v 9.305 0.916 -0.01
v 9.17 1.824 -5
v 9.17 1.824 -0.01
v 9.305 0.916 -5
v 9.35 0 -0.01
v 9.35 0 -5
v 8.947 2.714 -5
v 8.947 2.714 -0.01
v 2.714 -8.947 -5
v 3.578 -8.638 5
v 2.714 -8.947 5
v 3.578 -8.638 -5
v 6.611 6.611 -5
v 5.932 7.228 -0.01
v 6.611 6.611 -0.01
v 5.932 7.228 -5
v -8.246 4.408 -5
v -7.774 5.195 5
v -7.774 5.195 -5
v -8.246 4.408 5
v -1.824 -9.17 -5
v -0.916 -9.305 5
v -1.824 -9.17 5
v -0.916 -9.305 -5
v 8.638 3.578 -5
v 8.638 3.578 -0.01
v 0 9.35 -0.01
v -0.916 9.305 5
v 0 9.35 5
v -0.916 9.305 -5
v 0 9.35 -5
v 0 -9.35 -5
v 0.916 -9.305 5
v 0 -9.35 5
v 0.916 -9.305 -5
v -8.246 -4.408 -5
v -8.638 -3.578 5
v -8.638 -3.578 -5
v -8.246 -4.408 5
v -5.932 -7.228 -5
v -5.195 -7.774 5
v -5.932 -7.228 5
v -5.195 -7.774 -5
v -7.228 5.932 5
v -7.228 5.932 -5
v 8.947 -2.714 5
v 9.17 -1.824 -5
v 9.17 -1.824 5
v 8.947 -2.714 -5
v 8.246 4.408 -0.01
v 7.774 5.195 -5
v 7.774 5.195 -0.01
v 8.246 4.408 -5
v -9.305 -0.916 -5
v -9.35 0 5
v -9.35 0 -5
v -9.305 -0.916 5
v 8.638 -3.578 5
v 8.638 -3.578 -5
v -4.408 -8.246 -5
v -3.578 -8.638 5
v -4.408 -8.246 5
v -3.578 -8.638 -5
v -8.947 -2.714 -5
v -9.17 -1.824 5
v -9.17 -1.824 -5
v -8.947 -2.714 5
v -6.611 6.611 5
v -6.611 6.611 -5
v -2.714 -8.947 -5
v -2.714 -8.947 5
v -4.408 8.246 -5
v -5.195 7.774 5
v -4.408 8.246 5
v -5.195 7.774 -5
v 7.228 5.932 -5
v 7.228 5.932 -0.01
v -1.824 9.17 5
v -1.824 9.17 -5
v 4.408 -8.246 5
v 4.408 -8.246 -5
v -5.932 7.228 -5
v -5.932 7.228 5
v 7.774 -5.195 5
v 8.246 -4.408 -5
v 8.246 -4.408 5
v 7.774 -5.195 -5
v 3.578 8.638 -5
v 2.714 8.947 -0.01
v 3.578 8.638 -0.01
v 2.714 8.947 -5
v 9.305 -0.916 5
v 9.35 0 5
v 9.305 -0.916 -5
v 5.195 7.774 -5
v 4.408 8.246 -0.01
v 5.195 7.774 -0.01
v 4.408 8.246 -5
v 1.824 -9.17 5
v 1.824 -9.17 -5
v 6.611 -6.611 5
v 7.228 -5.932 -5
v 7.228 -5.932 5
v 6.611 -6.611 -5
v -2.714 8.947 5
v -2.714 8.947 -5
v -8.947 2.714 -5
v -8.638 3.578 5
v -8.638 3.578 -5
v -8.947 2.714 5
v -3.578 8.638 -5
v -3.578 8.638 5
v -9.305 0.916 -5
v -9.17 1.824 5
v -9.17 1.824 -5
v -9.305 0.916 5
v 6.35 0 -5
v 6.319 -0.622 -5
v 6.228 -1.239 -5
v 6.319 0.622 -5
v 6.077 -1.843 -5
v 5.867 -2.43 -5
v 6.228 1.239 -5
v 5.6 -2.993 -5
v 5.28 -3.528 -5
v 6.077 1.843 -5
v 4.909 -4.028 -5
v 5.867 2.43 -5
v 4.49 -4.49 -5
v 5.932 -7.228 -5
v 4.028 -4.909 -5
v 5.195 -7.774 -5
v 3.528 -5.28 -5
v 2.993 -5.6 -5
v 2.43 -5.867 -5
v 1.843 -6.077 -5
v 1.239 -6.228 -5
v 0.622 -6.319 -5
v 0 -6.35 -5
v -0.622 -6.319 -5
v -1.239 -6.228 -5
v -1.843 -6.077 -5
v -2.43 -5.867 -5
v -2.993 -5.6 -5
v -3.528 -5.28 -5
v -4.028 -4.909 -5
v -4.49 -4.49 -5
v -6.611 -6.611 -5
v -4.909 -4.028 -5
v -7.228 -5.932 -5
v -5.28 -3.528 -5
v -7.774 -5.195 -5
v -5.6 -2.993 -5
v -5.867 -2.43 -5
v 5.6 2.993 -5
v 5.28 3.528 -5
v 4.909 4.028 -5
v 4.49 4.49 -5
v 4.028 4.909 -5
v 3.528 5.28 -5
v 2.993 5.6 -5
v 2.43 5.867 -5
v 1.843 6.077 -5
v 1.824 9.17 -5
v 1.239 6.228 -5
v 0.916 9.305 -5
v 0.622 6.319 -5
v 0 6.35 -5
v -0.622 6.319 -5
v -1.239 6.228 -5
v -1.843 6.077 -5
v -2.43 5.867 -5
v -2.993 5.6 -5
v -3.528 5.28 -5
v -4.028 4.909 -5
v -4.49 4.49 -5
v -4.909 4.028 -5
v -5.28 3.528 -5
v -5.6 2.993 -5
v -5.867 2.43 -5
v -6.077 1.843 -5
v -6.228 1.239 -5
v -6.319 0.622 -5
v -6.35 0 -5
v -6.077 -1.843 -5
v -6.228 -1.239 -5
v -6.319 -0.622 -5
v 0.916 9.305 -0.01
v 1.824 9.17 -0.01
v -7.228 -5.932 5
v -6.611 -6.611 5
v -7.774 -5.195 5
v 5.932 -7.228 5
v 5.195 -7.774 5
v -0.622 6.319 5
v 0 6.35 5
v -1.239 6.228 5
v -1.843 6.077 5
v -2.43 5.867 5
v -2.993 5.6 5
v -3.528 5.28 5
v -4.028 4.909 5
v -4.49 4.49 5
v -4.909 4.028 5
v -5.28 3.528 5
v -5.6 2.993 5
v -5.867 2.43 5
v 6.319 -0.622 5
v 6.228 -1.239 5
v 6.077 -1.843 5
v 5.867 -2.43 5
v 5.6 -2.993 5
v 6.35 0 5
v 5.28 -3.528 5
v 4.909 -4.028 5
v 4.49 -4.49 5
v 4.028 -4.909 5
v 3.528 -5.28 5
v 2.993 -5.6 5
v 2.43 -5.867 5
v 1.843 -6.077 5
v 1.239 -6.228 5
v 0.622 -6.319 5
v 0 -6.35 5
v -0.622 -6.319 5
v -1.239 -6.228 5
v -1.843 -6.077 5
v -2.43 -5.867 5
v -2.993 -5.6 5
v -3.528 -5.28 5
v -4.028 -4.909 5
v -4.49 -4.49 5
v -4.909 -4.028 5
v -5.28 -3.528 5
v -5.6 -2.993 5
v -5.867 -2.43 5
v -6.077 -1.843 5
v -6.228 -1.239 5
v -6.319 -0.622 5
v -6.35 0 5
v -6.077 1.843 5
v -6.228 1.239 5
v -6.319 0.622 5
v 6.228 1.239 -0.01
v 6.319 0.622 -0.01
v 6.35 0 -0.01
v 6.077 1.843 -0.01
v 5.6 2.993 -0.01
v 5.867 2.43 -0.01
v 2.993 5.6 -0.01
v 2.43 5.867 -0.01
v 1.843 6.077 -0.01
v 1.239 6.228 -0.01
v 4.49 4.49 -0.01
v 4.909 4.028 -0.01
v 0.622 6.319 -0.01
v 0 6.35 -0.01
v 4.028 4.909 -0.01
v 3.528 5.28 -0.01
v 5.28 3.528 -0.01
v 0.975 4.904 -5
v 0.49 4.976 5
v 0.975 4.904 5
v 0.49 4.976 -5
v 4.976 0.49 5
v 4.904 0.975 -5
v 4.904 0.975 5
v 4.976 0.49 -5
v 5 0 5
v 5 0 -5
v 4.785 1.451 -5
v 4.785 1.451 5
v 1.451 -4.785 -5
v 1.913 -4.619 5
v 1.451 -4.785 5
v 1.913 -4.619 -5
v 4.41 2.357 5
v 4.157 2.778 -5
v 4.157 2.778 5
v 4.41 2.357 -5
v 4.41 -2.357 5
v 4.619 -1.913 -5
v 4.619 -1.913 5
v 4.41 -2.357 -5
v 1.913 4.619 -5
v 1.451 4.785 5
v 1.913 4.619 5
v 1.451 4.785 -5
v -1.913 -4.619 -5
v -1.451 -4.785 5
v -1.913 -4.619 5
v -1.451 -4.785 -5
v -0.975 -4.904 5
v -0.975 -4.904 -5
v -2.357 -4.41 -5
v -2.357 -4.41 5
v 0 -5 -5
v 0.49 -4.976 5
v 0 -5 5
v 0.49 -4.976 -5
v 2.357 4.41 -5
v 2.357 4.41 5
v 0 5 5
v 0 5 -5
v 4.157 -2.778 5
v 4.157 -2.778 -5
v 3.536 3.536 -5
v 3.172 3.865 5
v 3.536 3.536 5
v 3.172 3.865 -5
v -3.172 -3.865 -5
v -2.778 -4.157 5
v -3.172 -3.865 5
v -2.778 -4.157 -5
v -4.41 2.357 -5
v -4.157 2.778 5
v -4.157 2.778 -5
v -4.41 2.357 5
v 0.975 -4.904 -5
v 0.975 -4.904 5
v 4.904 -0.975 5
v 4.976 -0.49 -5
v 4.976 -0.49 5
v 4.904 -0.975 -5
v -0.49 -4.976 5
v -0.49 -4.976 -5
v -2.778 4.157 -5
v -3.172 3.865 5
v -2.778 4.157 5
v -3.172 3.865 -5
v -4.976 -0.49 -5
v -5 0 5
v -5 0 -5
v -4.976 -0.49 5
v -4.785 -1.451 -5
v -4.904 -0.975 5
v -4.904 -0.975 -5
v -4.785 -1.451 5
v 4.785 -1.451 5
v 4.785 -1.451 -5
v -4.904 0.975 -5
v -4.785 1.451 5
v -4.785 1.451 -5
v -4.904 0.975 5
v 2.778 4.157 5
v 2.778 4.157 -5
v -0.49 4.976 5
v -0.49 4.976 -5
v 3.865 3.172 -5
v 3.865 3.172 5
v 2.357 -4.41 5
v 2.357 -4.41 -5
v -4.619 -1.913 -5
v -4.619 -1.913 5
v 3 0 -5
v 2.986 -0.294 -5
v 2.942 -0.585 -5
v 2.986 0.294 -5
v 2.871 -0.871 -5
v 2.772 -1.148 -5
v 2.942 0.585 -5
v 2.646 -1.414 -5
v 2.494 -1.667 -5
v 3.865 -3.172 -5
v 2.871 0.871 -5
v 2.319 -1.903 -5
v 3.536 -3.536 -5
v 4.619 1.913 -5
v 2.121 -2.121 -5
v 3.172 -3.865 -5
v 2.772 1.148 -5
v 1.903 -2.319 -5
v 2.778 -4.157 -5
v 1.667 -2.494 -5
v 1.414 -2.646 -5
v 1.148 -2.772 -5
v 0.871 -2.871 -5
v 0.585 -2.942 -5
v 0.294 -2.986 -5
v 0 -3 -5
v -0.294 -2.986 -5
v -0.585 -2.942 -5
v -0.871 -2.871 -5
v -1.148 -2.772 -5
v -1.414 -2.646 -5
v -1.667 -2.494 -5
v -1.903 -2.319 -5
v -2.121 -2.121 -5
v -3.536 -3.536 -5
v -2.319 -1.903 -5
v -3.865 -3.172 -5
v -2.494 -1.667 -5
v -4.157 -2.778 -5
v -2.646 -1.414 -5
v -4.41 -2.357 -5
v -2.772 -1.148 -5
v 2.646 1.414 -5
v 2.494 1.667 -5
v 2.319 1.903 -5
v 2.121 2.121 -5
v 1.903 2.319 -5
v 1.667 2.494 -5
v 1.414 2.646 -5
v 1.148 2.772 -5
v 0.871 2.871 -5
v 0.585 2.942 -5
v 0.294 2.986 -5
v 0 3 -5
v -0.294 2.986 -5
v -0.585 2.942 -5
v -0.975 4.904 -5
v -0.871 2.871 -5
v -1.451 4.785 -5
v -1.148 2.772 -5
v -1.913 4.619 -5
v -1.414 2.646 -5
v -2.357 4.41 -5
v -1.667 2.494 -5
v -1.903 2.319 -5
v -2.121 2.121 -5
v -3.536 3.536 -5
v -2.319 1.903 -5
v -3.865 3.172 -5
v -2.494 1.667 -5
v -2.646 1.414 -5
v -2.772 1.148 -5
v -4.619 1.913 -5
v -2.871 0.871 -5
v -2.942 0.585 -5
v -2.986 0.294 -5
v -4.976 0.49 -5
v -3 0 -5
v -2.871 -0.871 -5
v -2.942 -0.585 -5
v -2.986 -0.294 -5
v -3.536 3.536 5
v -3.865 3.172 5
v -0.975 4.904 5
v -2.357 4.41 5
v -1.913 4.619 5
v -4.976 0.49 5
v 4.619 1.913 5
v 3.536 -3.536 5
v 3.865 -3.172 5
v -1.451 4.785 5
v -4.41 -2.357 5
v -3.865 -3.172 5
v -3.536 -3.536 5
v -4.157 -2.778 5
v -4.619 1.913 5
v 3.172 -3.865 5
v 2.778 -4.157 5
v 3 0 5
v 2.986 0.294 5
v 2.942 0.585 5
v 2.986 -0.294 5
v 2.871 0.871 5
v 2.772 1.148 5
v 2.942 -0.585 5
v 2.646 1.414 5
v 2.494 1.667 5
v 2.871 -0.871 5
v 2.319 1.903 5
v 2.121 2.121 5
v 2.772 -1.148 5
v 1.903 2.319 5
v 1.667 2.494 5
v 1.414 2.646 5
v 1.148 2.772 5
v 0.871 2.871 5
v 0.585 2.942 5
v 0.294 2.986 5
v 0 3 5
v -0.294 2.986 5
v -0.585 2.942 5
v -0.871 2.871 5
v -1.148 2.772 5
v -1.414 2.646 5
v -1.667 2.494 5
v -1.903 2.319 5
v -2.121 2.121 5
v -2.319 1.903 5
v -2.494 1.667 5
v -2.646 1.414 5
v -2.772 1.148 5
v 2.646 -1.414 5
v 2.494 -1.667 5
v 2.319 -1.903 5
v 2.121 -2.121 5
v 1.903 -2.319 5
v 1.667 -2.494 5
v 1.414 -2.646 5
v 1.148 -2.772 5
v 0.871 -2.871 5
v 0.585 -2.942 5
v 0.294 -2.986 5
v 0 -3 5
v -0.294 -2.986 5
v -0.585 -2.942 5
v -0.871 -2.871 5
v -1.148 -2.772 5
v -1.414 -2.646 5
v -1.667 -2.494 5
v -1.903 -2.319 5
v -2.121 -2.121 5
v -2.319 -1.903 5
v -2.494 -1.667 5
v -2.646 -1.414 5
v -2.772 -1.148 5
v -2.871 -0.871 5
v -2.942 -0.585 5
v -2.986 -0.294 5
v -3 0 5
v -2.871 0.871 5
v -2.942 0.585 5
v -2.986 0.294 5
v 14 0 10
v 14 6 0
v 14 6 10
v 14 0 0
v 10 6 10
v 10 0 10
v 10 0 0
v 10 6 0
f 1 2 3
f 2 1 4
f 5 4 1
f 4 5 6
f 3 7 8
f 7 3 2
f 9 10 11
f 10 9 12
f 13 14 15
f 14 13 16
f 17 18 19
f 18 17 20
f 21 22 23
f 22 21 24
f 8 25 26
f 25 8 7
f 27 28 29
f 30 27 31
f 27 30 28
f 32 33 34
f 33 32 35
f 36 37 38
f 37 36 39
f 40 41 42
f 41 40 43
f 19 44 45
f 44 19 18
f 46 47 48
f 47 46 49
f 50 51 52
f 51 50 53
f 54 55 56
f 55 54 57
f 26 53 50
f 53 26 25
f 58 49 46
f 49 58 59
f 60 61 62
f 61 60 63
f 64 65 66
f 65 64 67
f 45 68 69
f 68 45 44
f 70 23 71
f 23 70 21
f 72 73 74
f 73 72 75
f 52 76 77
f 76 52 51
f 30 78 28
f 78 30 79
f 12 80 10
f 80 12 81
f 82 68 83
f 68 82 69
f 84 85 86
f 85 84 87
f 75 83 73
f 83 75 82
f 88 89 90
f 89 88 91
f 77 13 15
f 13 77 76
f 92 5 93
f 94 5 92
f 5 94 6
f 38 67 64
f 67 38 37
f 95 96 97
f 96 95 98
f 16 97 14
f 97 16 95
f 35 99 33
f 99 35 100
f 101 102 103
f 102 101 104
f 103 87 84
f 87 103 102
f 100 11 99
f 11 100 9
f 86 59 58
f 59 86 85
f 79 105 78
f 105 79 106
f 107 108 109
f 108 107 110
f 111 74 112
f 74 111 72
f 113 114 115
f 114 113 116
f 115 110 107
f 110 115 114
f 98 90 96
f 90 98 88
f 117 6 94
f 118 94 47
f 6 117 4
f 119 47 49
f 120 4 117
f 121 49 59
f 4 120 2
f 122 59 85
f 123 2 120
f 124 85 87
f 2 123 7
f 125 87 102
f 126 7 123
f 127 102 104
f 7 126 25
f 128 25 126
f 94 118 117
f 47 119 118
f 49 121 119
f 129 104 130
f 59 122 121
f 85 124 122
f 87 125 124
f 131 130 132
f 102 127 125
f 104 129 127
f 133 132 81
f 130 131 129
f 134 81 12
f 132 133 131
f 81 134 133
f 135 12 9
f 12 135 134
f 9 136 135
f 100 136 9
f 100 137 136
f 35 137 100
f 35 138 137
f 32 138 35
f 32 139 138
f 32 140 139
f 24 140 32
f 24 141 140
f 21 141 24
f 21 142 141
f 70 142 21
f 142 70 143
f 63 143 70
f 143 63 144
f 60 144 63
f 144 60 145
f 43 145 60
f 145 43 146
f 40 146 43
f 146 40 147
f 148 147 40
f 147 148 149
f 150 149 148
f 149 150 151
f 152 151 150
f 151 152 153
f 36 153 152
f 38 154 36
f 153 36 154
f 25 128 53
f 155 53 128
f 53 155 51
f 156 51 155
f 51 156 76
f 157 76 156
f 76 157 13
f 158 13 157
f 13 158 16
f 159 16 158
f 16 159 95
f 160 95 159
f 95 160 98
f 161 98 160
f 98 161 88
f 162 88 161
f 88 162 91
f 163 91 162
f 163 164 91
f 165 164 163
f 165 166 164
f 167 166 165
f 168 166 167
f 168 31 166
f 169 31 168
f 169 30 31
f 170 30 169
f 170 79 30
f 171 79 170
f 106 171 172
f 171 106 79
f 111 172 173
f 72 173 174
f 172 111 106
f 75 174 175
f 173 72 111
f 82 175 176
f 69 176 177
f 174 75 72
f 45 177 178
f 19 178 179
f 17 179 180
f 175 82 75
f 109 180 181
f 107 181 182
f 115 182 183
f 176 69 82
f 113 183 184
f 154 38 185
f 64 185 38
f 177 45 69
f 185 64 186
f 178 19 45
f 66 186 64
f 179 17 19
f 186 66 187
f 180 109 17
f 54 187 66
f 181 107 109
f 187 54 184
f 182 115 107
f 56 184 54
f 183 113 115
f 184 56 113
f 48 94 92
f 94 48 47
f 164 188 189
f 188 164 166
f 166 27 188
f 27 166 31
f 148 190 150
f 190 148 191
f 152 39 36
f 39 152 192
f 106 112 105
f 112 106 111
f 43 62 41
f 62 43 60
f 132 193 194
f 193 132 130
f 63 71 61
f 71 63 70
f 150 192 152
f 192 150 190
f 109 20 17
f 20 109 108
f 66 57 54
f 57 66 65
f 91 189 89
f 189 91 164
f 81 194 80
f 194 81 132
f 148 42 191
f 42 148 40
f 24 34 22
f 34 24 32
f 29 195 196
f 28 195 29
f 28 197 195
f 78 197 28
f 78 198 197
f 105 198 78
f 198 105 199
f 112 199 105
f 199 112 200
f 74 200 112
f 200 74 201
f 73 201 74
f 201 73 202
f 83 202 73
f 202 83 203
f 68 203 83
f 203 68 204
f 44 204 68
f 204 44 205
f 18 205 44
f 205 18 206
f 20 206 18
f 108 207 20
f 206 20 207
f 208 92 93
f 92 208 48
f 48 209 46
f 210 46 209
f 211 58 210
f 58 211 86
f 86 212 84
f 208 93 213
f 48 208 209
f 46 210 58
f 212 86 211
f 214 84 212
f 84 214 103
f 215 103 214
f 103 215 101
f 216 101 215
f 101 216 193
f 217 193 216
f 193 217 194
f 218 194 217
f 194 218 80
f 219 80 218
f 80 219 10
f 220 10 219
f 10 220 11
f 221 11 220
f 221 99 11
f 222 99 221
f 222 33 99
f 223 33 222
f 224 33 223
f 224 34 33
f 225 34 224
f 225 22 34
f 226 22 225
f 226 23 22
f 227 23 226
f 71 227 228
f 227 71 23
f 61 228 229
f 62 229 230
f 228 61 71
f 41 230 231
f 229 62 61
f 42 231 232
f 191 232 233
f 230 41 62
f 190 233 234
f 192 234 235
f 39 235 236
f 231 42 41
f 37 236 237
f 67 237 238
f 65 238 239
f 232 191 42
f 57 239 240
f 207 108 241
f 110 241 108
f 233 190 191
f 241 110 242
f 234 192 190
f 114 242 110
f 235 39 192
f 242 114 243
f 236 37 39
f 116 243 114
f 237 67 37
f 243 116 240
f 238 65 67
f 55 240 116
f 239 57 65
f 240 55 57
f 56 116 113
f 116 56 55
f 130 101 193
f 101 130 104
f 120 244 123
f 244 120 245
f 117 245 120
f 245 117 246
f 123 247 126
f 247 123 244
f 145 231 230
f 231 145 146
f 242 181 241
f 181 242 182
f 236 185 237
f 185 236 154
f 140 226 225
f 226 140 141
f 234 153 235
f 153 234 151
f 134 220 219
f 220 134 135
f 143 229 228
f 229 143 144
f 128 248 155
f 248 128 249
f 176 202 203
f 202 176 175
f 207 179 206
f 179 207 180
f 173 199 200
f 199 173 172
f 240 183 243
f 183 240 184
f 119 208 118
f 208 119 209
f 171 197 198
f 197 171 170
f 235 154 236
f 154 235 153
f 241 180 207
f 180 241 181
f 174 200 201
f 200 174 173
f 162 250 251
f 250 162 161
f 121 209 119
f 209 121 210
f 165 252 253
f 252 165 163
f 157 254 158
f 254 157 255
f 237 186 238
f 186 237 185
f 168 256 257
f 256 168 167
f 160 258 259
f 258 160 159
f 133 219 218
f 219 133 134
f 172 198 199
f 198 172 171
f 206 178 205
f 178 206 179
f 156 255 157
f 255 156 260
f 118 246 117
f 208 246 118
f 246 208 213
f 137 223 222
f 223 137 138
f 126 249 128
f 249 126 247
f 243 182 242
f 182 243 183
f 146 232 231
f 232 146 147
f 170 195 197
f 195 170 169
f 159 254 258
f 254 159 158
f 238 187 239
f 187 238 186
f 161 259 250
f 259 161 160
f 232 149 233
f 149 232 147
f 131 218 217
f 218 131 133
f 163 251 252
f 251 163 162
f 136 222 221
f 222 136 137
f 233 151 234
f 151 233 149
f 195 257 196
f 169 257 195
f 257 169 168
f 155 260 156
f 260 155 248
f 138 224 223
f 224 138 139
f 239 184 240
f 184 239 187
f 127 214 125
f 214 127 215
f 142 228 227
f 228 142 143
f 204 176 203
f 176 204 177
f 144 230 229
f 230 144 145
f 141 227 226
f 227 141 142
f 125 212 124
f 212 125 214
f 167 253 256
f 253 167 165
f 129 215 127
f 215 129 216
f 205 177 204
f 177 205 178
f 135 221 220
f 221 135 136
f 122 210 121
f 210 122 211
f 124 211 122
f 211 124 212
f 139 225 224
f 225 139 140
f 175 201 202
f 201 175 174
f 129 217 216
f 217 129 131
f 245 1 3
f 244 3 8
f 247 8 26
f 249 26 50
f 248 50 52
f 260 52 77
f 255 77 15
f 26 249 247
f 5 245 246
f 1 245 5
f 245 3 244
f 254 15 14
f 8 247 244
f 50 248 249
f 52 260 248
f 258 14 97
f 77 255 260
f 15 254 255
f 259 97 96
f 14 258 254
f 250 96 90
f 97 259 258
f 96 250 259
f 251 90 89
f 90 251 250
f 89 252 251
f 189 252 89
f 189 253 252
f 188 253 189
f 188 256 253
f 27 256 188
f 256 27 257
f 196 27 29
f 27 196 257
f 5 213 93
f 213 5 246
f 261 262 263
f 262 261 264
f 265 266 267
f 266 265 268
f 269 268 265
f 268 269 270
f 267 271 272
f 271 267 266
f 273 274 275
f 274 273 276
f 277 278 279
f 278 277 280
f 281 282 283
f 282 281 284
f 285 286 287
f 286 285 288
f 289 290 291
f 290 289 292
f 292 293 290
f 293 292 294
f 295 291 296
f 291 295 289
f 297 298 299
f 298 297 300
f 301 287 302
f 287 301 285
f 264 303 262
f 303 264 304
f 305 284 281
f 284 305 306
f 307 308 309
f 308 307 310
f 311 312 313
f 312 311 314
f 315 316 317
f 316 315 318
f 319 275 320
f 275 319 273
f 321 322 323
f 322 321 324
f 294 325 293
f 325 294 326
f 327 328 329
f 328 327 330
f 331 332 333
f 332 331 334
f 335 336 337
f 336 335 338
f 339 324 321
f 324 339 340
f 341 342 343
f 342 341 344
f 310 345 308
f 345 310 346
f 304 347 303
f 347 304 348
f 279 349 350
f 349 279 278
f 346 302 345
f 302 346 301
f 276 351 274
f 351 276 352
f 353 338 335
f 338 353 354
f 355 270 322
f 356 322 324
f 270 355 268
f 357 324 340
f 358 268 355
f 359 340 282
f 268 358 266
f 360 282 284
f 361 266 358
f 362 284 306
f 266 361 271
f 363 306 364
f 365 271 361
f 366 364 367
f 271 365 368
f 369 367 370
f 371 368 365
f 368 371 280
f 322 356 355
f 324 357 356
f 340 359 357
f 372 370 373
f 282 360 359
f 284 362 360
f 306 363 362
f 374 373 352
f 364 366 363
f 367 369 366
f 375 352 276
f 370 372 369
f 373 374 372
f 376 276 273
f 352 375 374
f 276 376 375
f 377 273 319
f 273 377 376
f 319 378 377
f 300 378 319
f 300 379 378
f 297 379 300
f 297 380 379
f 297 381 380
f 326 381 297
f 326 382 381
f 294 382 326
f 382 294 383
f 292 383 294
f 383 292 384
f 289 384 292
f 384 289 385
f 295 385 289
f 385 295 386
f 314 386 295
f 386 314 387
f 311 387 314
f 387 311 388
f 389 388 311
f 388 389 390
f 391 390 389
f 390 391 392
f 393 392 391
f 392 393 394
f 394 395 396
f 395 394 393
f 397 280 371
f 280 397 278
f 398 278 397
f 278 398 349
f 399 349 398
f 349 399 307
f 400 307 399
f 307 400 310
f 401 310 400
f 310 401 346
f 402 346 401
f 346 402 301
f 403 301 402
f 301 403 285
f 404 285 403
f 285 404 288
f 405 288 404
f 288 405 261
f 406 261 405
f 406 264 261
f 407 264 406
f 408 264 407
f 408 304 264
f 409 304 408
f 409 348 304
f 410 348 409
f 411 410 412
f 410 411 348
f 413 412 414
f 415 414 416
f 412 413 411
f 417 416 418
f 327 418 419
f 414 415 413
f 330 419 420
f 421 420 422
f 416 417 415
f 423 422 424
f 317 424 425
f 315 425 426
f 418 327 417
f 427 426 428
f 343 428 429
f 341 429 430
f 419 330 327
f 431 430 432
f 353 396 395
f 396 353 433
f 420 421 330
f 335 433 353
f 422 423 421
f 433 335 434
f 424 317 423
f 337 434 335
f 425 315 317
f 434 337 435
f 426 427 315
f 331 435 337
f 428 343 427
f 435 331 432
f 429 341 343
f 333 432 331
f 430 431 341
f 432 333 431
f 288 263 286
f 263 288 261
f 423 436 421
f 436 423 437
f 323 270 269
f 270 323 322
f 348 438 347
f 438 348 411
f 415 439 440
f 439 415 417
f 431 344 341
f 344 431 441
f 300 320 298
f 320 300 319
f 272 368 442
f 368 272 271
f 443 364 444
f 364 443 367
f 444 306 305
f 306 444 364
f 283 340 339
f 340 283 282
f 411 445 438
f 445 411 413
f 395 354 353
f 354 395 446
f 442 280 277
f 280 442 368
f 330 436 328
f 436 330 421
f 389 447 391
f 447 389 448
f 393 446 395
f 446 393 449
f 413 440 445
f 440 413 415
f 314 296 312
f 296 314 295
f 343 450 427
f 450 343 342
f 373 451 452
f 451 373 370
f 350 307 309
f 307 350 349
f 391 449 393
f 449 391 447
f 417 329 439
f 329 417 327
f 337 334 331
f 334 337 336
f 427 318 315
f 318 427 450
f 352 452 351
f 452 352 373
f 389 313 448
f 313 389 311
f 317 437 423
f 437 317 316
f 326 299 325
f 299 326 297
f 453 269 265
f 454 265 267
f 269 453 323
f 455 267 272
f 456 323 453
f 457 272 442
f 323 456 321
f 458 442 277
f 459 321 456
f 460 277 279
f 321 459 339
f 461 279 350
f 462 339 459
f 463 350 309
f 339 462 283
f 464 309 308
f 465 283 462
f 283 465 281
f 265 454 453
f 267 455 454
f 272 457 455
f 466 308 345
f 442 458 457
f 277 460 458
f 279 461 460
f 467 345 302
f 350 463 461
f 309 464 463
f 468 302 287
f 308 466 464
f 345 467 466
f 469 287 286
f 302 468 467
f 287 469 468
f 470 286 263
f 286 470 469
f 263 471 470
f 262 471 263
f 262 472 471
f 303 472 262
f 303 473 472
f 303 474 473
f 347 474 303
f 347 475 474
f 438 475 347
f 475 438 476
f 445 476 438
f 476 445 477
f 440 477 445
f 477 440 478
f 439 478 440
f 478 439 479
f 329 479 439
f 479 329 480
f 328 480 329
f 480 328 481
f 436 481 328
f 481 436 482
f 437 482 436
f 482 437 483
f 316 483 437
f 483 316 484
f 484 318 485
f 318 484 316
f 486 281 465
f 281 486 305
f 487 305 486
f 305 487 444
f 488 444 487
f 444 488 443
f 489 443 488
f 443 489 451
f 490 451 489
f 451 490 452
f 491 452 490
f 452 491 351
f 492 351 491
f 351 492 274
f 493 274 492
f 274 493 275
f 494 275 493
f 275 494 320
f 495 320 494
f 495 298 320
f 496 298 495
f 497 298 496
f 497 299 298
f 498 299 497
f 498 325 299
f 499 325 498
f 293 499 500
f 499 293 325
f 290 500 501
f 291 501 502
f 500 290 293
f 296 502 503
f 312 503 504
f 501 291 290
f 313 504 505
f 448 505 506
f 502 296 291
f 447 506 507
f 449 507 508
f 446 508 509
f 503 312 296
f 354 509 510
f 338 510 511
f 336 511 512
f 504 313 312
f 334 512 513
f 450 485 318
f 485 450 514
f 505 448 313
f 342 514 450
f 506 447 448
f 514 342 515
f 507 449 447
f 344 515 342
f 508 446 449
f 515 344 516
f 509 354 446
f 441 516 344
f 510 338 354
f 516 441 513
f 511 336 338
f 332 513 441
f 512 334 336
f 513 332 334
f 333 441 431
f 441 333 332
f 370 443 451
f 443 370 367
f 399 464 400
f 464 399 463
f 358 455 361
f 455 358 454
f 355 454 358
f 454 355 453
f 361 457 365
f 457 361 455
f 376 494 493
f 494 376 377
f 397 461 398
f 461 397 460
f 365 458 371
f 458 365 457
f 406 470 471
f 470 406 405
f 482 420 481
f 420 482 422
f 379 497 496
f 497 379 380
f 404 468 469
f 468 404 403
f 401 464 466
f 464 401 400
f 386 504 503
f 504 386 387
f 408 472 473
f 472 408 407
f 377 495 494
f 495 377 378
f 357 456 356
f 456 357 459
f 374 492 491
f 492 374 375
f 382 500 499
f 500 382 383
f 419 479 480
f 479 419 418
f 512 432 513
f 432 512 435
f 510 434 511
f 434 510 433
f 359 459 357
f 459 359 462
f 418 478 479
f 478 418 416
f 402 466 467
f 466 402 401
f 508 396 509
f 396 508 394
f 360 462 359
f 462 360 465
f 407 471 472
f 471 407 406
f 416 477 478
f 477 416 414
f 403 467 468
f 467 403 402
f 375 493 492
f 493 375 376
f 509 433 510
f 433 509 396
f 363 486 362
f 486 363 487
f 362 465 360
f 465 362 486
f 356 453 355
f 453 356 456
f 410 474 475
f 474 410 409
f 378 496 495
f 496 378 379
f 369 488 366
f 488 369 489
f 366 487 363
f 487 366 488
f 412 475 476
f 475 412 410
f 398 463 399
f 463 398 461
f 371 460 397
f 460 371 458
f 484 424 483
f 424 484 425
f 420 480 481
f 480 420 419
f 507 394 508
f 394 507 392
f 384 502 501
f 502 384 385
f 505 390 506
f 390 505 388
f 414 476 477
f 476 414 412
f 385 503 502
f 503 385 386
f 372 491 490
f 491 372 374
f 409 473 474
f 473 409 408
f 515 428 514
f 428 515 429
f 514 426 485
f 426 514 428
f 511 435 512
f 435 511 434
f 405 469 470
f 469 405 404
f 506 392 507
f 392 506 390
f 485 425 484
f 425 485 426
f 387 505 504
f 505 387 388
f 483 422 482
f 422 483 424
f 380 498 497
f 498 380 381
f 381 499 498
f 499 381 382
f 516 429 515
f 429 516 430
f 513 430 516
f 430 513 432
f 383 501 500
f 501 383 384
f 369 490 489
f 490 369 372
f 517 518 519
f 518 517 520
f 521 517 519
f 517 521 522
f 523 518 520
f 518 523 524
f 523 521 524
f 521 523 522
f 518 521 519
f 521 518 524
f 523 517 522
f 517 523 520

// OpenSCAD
$fn = 64;

// Dimensions
rod_diameter = 12.7;           // Inner diameter of rod ring
rod_wall = 3;                 // Wall thickness of rod ring
rod_outer_diameter = rod_diameter + 2 * rod_wall;  // 18.7 mm

tubing_inner_diameter = 6;      // Inner diameter of tubing ring
tubing_wall = 2;                // Wall thickness of tubing ring
tubing_outer_diameter = tubing_inner_diameter + 2 * tubing_wall;  // 10 mm

bridge_width_y = 6;           // Width of bridge in Y direction
bridge_start_x = 8;         // Start X of bridge
bridge_end_x = 12;          // End X of bridge

// Rod ring: centered at origin, with -X side opening
rod_ring_inner_radius = rod_diameter / 2;
rod_ring_outer_radius = rod_outer_diameter / 2;

// Tubing ring: centered at (15, 0), with +X side opening
tubing_ring_center_x = 15;
tubing_ring_center_y = 0;
tubing_ring_inner_radius = tubing_inner_diameter / 2;
tubing_ring_outer_radius = tubing_outer_diameter / 2;

// Opening dimensions
rod_opening_width = 10;     // Width of opening in rod ring (-X side)
rod_opening_half_y = rod_opening_width / 2;  // -5 to +5

tubing_opening_width = 4.5;    // Width of opening in tubing ring (+X side)
tubing_opening_half_y = tubing_opening_width / 2;  // -2.25 to +2.25

// Bridge: solid connection between rings, 6 mm wide in Y, from x=8 to x=12
bridge_y_min = -bridge_width_y / 2;
bridge_y_max = bridge_width_y / 2;

// Build the clip
module clip() {
    // Rod ring with -X side opening
    difference() {
        // Outer ring (full circle)
        cylinder(h = 10, r = rod_ring_outer_radius, center = true);
        // Inner hole (full circle)
        cylinder(h = 10, r = rod_ring_inner_radius, center = true);
        // Cut out the opening: a rectangle from x = -rod_ring_outer_radius to x = 0, y = -5 to 5
        translate([0, 0, -0.01]) // Slight offset to avoid coplanar faces
        cube([rod_ring_outer_radius * 2 + 1, rod_opening_width + 0.1, 10], center = false);
    }

    // Tubing ring with +X side opening
    difference() {
        // Outer ring (full circle)
        cylinder(h = 10, r = tubing_ring_outer_radius, center = true);
        // Inner hole (full circle)
        cylinder(h = 10, r = tubing_ring_inner_radius, center = true);
        // Cut out the opening: a rectangle from x = 15 to x = 15 + tubing_ring_outer_radius, y = -2.25 to 2.25
        translate([tubing_ring_center_x, 0, -0.01])
        cube([tubing_ring_outer_radius * 2 + 1, tubing_opening_width + 0.1, 10], center = false);
    }

    // Bridge: solid rectangle connecting the two rings
    // From x = 8 to 12, y = -3 to 3 (6 mm wide), z = 0 to 10
    translate([bridge_start_x + (bridge_end_x - bridge_start_x)/2, 0, 0])
    cube([bridge_end_x - bridge_start_x, bridge_width_y, 10], center = false);
}

// Assemble the entire clip
clip();
